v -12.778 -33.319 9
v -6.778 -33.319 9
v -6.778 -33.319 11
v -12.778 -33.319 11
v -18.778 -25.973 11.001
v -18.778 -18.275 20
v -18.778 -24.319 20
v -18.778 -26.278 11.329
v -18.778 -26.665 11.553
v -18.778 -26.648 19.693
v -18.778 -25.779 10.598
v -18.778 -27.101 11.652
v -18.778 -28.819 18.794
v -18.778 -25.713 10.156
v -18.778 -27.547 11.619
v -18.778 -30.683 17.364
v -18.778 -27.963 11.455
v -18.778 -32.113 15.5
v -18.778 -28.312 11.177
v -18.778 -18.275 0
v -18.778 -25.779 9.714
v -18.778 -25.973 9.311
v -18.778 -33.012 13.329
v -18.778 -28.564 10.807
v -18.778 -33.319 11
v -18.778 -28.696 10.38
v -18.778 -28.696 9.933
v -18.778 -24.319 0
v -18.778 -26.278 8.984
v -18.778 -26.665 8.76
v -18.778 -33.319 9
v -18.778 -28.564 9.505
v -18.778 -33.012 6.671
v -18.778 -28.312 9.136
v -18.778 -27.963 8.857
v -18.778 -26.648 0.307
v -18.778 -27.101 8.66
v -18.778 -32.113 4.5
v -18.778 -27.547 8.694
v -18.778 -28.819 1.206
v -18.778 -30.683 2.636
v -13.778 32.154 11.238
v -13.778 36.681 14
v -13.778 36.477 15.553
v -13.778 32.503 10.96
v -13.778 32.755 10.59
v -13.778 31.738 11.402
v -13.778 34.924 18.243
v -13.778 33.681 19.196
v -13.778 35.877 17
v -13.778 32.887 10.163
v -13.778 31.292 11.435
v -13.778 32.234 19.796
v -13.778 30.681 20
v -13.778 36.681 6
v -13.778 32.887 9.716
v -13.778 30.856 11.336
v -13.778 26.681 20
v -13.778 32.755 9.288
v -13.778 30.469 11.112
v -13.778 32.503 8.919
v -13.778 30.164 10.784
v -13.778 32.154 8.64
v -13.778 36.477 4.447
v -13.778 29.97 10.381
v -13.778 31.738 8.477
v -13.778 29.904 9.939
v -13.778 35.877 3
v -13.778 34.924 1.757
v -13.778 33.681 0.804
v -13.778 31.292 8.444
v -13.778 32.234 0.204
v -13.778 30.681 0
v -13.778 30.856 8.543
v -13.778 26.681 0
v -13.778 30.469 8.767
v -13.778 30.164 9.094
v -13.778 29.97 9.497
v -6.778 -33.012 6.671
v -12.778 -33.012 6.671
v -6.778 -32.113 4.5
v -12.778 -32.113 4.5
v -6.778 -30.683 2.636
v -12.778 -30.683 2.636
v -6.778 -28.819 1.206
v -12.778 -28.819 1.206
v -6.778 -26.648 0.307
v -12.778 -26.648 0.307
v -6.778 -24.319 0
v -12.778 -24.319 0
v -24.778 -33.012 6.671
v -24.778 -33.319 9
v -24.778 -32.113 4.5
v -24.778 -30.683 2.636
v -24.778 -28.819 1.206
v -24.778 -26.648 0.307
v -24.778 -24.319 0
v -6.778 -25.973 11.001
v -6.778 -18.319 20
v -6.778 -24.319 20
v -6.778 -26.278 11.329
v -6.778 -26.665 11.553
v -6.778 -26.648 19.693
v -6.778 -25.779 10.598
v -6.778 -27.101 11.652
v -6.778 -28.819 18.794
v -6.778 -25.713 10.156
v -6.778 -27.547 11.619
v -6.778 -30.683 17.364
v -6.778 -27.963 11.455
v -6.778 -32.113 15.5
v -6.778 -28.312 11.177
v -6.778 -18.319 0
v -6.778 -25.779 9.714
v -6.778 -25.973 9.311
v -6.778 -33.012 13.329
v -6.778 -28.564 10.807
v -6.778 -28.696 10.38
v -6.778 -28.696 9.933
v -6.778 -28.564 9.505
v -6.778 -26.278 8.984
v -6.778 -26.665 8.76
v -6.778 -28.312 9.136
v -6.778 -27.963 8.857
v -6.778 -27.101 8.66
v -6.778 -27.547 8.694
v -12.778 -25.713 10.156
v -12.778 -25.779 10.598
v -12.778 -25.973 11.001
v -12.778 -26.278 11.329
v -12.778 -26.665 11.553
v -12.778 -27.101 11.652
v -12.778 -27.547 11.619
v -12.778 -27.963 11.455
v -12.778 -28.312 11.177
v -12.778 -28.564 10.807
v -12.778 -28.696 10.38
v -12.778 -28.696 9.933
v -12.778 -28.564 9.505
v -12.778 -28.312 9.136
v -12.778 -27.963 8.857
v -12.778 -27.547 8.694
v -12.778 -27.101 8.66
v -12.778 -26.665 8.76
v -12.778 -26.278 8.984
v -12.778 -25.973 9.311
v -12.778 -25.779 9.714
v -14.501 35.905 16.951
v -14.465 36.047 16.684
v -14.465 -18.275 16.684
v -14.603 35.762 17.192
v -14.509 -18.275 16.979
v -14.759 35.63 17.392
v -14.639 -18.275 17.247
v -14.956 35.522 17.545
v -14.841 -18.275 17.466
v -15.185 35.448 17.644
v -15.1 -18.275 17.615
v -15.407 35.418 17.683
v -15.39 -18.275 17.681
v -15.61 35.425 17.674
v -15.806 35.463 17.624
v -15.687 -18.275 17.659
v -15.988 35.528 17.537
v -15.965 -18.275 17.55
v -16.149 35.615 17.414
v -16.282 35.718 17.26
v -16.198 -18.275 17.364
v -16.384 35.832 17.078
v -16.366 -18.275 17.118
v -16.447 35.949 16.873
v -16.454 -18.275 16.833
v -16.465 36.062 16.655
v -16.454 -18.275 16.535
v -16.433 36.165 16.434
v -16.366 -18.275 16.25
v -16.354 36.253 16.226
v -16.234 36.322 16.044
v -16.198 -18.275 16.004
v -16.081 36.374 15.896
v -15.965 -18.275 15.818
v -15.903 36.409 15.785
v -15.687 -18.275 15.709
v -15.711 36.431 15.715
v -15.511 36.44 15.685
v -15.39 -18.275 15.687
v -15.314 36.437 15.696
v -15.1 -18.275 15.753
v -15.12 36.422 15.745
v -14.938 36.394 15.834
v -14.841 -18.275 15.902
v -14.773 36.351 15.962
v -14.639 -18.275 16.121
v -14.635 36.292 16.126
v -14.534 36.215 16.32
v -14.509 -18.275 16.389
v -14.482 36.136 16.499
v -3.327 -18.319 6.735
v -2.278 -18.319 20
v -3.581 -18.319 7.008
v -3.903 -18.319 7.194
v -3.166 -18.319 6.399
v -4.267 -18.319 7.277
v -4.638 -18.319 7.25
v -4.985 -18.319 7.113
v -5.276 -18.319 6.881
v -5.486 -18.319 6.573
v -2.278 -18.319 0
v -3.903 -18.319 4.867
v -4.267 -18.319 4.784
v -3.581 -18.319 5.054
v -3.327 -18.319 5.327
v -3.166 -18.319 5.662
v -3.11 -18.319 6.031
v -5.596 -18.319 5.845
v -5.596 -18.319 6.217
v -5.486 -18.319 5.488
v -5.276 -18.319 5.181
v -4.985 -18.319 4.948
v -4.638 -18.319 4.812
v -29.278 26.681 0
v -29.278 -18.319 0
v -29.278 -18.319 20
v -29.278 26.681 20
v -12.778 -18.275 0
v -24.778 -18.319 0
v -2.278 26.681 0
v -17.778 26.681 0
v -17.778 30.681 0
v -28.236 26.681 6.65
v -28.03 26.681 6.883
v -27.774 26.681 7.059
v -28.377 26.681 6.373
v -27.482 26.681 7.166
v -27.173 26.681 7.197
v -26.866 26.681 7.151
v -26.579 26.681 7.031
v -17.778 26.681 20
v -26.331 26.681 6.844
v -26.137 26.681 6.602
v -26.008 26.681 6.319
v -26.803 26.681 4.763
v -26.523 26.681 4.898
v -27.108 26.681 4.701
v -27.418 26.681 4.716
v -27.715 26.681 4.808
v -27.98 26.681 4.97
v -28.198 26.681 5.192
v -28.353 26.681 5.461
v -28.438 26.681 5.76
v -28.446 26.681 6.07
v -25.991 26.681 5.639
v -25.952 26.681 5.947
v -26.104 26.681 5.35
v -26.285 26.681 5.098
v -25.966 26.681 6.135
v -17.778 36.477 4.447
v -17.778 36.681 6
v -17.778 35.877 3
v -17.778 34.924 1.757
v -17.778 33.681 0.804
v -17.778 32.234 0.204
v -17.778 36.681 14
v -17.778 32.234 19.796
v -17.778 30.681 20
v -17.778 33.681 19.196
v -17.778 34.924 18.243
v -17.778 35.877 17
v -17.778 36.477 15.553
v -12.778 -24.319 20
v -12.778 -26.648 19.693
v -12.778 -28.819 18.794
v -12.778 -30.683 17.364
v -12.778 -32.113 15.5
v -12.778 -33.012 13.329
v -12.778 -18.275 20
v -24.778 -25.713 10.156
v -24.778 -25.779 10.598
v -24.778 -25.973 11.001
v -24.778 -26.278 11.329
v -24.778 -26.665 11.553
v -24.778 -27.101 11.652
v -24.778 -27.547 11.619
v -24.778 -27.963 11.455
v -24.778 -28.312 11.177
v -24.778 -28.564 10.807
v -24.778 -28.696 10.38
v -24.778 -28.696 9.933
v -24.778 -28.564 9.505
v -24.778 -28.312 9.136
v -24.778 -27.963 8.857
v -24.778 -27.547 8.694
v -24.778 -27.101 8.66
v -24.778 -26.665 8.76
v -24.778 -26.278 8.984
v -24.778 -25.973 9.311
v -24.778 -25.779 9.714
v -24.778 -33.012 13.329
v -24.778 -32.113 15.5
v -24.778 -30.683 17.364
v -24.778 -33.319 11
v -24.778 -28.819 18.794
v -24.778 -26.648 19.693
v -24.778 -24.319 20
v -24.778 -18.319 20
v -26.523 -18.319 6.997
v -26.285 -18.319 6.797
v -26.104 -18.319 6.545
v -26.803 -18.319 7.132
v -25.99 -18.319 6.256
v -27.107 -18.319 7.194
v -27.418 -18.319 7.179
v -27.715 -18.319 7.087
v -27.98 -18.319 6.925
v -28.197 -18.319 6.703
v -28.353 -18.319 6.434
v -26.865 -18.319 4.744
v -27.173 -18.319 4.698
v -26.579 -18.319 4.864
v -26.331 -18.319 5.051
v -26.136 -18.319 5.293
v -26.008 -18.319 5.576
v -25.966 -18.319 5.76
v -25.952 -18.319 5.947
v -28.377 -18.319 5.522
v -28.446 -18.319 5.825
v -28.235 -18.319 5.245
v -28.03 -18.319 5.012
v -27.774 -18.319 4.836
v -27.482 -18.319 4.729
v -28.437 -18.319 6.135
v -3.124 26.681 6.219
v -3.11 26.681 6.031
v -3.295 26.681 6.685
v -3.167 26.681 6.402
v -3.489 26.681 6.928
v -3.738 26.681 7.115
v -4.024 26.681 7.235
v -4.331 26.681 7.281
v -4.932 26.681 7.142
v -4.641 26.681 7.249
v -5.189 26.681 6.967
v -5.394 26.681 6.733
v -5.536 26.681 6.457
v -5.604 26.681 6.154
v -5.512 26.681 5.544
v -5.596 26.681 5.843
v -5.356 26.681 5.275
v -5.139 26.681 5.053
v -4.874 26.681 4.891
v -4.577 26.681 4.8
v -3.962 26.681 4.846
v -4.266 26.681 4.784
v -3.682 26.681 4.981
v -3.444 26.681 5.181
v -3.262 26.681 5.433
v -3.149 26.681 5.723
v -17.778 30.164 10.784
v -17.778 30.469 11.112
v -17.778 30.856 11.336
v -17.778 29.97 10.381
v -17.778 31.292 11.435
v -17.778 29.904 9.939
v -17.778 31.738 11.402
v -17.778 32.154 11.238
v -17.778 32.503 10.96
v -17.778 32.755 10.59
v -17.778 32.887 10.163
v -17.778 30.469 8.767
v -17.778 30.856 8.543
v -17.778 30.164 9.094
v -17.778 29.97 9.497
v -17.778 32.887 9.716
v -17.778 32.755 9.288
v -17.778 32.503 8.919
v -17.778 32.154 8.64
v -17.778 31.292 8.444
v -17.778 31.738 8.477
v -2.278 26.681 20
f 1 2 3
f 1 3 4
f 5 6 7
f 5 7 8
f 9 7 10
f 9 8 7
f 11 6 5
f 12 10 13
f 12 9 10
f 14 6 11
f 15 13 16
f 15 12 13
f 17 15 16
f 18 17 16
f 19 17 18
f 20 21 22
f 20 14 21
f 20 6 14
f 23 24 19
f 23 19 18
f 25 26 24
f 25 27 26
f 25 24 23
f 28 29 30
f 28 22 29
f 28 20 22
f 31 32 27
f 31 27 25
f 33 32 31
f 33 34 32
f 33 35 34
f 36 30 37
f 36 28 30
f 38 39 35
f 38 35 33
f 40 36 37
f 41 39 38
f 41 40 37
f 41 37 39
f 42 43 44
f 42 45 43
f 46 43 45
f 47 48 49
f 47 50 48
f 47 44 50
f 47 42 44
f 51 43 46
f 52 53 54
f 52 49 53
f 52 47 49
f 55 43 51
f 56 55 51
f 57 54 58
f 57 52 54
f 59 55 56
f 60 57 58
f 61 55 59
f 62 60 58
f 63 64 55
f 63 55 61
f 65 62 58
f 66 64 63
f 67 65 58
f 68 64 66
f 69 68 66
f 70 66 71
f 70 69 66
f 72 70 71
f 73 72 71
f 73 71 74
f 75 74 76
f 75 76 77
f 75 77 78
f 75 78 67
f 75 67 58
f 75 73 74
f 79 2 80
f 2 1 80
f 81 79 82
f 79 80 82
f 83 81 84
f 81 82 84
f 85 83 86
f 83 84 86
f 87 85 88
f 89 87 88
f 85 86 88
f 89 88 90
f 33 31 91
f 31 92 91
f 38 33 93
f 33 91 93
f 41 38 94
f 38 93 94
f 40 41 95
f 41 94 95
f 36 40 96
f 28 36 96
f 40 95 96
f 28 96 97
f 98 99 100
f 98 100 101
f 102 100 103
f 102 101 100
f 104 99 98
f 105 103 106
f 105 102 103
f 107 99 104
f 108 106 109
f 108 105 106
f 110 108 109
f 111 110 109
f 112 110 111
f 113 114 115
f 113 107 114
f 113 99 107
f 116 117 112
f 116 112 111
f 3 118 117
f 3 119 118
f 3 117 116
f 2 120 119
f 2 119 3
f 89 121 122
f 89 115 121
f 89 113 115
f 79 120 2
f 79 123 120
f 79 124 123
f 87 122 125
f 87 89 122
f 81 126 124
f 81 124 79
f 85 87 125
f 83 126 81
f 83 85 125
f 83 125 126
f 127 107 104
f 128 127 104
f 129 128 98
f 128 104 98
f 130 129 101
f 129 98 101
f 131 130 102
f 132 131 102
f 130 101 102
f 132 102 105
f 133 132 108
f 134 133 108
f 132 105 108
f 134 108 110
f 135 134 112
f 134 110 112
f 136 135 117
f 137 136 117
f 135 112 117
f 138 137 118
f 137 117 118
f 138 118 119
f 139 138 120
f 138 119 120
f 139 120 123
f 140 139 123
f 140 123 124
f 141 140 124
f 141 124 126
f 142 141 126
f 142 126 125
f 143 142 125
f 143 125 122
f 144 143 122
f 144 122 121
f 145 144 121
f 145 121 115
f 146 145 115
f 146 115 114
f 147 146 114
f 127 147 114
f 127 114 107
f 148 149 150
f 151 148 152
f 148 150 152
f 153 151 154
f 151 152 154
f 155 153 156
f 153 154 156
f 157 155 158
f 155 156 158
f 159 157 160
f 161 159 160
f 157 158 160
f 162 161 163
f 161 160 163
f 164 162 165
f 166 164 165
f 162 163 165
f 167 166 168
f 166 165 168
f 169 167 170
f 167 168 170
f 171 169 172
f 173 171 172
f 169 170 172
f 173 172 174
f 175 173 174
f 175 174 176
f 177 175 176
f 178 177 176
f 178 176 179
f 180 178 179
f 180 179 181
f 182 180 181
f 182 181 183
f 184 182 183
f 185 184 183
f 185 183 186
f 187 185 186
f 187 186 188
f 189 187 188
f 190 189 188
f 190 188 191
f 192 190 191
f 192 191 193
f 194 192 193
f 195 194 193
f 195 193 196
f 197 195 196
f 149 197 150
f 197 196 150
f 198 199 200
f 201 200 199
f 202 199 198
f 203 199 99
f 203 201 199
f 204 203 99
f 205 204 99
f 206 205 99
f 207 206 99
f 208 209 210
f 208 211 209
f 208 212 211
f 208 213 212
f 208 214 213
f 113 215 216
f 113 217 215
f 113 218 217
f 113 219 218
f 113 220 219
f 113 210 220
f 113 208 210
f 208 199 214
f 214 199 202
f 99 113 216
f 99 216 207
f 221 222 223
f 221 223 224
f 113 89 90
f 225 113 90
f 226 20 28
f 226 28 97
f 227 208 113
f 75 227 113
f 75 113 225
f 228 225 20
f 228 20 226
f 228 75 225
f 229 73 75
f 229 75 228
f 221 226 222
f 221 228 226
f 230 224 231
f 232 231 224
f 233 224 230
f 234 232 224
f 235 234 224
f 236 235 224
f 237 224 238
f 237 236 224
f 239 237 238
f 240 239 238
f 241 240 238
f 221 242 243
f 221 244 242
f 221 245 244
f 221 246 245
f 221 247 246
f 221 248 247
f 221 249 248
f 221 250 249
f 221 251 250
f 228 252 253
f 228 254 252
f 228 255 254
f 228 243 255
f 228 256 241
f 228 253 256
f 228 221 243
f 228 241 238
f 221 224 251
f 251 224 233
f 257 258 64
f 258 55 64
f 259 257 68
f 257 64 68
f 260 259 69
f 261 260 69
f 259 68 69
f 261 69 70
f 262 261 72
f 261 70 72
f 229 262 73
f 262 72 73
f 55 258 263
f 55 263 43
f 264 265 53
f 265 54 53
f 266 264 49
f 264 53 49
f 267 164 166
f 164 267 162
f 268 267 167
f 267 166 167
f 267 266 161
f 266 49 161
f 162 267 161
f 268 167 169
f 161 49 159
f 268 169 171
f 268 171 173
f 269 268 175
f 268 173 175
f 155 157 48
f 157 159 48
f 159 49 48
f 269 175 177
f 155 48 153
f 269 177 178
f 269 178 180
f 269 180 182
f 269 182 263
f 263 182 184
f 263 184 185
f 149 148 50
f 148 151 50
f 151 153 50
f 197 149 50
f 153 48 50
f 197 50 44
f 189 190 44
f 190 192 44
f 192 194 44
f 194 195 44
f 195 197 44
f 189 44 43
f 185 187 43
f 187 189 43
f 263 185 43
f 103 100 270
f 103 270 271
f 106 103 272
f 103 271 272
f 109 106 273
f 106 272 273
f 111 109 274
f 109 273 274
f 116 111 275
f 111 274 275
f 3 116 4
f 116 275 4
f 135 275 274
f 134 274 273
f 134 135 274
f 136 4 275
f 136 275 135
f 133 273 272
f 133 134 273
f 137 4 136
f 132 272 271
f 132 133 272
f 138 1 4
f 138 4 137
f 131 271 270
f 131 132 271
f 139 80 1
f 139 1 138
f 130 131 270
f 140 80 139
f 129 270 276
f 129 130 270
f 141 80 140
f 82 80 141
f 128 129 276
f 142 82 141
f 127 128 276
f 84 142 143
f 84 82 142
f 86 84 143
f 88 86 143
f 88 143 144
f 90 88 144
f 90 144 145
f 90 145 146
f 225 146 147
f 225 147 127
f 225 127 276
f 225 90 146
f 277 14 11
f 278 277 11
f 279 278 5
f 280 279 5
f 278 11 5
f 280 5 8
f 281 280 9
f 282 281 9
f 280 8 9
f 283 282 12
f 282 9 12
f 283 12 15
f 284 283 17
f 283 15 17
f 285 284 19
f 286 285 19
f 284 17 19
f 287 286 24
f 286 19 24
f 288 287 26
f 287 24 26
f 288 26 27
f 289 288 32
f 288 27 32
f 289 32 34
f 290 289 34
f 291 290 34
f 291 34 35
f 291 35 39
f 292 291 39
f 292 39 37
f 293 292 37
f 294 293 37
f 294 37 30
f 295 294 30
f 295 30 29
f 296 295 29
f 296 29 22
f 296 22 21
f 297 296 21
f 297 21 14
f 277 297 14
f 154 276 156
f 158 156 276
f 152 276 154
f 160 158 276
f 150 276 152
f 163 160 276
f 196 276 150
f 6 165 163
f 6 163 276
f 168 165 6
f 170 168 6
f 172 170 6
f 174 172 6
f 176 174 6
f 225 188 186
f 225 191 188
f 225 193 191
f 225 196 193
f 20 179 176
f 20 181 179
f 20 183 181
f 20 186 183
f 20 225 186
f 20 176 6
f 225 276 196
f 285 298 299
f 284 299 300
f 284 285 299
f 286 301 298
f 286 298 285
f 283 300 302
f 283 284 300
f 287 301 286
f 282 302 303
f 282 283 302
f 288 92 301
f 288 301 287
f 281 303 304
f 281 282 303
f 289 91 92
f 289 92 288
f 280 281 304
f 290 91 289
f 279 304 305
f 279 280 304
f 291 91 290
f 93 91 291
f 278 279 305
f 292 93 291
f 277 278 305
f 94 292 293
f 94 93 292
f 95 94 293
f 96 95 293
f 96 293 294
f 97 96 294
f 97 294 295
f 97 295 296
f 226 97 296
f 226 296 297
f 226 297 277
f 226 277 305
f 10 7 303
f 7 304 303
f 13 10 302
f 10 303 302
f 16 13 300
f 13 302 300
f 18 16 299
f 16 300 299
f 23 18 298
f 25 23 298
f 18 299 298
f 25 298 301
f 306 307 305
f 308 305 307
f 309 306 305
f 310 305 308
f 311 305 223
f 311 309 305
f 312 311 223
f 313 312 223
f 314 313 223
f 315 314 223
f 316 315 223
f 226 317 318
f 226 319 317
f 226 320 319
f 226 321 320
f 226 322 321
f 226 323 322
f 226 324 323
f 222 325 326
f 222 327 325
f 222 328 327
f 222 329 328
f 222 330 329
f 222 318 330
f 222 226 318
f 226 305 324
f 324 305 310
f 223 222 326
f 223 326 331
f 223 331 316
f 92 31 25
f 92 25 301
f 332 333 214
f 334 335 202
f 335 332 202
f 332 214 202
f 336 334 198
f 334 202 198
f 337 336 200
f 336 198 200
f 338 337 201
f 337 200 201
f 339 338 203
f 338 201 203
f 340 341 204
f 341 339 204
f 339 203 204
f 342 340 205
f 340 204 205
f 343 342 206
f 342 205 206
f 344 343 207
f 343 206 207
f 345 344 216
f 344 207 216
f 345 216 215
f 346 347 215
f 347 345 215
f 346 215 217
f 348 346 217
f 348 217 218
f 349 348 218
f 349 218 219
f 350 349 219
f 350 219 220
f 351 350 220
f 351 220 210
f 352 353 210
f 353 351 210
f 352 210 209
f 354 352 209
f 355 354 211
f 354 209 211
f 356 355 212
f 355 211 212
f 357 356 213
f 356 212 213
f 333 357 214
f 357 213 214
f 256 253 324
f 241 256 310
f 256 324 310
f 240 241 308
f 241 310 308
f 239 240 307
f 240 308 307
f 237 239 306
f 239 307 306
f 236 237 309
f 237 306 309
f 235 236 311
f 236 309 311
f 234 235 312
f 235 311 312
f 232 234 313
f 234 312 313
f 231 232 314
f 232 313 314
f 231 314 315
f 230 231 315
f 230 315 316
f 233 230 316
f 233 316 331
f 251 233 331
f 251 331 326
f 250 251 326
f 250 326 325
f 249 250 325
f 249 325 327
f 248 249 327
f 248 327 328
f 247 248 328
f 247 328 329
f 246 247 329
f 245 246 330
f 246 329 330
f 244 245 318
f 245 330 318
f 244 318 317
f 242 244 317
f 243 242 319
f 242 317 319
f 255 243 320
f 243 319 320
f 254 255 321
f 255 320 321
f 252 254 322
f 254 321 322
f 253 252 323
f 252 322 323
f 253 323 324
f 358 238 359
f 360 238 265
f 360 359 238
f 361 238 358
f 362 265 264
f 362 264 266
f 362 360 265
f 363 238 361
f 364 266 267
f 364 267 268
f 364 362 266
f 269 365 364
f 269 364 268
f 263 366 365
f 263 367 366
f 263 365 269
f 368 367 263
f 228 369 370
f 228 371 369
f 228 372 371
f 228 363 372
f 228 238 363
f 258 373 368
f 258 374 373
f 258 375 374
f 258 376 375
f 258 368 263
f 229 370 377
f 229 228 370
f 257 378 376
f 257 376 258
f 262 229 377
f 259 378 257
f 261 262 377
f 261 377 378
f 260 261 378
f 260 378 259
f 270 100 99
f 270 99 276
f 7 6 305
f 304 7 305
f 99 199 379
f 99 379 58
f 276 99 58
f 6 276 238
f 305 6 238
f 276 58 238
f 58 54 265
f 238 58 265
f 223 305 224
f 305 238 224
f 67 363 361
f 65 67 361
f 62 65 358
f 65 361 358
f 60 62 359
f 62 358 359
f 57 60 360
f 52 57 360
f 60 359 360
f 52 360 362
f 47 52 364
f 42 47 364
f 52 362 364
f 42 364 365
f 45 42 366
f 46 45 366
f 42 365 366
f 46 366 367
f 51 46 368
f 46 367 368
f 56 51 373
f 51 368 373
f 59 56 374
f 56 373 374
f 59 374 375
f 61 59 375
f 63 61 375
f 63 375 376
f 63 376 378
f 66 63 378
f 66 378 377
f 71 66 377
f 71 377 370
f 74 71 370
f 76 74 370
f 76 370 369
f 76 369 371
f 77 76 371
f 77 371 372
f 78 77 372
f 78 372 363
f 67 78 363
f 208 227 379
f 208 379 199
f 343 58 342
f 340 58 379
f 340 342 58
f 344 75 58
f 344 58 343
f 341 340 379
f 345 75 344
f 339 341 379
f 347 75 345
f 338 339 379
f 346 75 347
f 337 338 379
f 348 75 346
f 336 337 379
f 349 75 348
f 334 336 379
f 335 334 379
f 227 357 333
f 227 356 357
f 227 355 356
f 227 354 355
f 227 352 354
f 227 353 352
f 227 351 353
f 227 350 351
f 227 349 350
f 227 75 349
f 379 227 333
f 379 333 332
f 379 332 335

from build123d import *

# Parameters (mm, degrees)
PAD_DEPTH       = 20
SKETCH001_R     = 1.5
POCKET_DEPTH    = 22.501
FILLET_R        = 9
FILLET001_R     = 9
FILLET002_R     = 9
FILLET003_R     = 9
FILLET004_R     = 6
FILLET005_R     = 6
SKETCH002_R     = 1.5
POCKET001_DEPTH = 15.501
SKETCH003_R     = 1.25
POCKET002_DEPTH = 55.001155
SKETCH004_R     = 1
POCKET003_DEPTH = 54.95679


with BuildPart() as part:
    # Sketch → Pad (new body)
    with BuildSketch(Plane.XY):
        Polygon((-29.277703, 26.681208), (-17.777703, 26.681208), (-17.777703, 36.681208), (-13.777703, 36.681208), (-13.777703, 26.681208), (-2.277703, 26.681208), (-2.277703, -18.318792), (-6.777703, -18.318818), (-6.777703, -33.318818), (-12.777703, -33.318818), (-12.777703, -18.274582), (-18.777703, -18.274582), (-18.777703, -33.318792), (-24.777703, -33.318792), (-24.777703, -18.318792), (-29.277703, -18.318792), align=None)
    extrude(amount=PAD_DEPTH)

    # Sketch001 (on Face8 of Pad) → Pocket (cut, through all)
    with BuildSketch(Plane.YZ.offset(-6.777703)):
        with Locations((-27.212769, 10.156303)):
            Circle(SKETCH001_R)
    extrude(amount=-POCKET_DEPTH, mode=Mode.SUBTRACT)

    # Fillet
    fillet_edges = [part.edges().sort_by_distance(p)[0] for p in [
        (-21.777703, -33.318792, 20),
    ]]
    fillet(fillet_edges, radius=FILLET_R)

    # Fillet001
    fillet001_edges = [part.edges().sort_by_distance(p)[0] for p in [
        (-21.777703, -33.318792, 0),
    ]]
    fillet(fillet001_edges, radius=FILLET001_R)

    # Fillet002
    fillet002_edges = [part.edges().sort_by_distance(p)[0] for p in [
        (-9.777703, -33.318818, 20),
    ]]
    fillet(fillet002_edges, radius=FILLET002_R)

    # Fillet003
    fillet003_edges = [part.edges().sort_by_distance(p)[0] for p in [
        (-9.777703, -33.318818, 0),
    ]]
    fillet(fillet003_edges, radius=FILLET003_R)

    # Fillet004
    fillet004_edges = [part.edges().sort_by_distance(p)[0] for p in [
        (-15.777703, 36.681208, 20),
    ]]
    fillet(fillet004_edges, radius=FILLET004_R)

    # Fillet005
    fillet005_edges = [part.edges().sort_by_distance(p)[0] for p in [
        (-15.777703, 36.681208, 0),
    ]]
    fillet(fillet005_edges, radius=FILLET005_R)

    # Sketch002 (on Face8 of Fillet005) → Pocket001 (cut, through all)
    with BuildSketch(Plane(origin=(-17.777703, 0, 0), x_dir=(0, -1, 0), z_dir=(-1, 0, 0))):
        with Locations((-31.403757, 9.939318)):
            Circle(SKETCH002_R)
    extrude(amount=-POCKET001_DEPTH, mode=Mode.SUBTRACT)

    # Sketch003 (on Face12 of Pocket001) → Pocket002 (cut, through all)
    with BuildSketch(Plane(origin=(0.000105, -18.318779, 0), x_dir=(1, 6e-06, 0), z_dir=(6e-06, -1, 0))):
        with Locations((-27.20172, 5.947487)):
            Circle(SKETCH003_R)
        with Locations((-4.360133, 6.030852)):
            Circle(SKETCH003_R)
    extrude(amount=-POCKET002_DEPTH, mode=Mode.SUBTRACT)

    # Sketch004 (on Face20 of Pocket002) → Pocket003 (cut, through all)
    with BuildSketch(Plane.XZ.offset(18.274582)):
        with Locations((-15.464924, 16.684162)):
            Circle(SKETCH004_R)
    extrude(amount=-POCKET003_DEPTH, mode=Mode.SUBTRACT)


solid = part.part
